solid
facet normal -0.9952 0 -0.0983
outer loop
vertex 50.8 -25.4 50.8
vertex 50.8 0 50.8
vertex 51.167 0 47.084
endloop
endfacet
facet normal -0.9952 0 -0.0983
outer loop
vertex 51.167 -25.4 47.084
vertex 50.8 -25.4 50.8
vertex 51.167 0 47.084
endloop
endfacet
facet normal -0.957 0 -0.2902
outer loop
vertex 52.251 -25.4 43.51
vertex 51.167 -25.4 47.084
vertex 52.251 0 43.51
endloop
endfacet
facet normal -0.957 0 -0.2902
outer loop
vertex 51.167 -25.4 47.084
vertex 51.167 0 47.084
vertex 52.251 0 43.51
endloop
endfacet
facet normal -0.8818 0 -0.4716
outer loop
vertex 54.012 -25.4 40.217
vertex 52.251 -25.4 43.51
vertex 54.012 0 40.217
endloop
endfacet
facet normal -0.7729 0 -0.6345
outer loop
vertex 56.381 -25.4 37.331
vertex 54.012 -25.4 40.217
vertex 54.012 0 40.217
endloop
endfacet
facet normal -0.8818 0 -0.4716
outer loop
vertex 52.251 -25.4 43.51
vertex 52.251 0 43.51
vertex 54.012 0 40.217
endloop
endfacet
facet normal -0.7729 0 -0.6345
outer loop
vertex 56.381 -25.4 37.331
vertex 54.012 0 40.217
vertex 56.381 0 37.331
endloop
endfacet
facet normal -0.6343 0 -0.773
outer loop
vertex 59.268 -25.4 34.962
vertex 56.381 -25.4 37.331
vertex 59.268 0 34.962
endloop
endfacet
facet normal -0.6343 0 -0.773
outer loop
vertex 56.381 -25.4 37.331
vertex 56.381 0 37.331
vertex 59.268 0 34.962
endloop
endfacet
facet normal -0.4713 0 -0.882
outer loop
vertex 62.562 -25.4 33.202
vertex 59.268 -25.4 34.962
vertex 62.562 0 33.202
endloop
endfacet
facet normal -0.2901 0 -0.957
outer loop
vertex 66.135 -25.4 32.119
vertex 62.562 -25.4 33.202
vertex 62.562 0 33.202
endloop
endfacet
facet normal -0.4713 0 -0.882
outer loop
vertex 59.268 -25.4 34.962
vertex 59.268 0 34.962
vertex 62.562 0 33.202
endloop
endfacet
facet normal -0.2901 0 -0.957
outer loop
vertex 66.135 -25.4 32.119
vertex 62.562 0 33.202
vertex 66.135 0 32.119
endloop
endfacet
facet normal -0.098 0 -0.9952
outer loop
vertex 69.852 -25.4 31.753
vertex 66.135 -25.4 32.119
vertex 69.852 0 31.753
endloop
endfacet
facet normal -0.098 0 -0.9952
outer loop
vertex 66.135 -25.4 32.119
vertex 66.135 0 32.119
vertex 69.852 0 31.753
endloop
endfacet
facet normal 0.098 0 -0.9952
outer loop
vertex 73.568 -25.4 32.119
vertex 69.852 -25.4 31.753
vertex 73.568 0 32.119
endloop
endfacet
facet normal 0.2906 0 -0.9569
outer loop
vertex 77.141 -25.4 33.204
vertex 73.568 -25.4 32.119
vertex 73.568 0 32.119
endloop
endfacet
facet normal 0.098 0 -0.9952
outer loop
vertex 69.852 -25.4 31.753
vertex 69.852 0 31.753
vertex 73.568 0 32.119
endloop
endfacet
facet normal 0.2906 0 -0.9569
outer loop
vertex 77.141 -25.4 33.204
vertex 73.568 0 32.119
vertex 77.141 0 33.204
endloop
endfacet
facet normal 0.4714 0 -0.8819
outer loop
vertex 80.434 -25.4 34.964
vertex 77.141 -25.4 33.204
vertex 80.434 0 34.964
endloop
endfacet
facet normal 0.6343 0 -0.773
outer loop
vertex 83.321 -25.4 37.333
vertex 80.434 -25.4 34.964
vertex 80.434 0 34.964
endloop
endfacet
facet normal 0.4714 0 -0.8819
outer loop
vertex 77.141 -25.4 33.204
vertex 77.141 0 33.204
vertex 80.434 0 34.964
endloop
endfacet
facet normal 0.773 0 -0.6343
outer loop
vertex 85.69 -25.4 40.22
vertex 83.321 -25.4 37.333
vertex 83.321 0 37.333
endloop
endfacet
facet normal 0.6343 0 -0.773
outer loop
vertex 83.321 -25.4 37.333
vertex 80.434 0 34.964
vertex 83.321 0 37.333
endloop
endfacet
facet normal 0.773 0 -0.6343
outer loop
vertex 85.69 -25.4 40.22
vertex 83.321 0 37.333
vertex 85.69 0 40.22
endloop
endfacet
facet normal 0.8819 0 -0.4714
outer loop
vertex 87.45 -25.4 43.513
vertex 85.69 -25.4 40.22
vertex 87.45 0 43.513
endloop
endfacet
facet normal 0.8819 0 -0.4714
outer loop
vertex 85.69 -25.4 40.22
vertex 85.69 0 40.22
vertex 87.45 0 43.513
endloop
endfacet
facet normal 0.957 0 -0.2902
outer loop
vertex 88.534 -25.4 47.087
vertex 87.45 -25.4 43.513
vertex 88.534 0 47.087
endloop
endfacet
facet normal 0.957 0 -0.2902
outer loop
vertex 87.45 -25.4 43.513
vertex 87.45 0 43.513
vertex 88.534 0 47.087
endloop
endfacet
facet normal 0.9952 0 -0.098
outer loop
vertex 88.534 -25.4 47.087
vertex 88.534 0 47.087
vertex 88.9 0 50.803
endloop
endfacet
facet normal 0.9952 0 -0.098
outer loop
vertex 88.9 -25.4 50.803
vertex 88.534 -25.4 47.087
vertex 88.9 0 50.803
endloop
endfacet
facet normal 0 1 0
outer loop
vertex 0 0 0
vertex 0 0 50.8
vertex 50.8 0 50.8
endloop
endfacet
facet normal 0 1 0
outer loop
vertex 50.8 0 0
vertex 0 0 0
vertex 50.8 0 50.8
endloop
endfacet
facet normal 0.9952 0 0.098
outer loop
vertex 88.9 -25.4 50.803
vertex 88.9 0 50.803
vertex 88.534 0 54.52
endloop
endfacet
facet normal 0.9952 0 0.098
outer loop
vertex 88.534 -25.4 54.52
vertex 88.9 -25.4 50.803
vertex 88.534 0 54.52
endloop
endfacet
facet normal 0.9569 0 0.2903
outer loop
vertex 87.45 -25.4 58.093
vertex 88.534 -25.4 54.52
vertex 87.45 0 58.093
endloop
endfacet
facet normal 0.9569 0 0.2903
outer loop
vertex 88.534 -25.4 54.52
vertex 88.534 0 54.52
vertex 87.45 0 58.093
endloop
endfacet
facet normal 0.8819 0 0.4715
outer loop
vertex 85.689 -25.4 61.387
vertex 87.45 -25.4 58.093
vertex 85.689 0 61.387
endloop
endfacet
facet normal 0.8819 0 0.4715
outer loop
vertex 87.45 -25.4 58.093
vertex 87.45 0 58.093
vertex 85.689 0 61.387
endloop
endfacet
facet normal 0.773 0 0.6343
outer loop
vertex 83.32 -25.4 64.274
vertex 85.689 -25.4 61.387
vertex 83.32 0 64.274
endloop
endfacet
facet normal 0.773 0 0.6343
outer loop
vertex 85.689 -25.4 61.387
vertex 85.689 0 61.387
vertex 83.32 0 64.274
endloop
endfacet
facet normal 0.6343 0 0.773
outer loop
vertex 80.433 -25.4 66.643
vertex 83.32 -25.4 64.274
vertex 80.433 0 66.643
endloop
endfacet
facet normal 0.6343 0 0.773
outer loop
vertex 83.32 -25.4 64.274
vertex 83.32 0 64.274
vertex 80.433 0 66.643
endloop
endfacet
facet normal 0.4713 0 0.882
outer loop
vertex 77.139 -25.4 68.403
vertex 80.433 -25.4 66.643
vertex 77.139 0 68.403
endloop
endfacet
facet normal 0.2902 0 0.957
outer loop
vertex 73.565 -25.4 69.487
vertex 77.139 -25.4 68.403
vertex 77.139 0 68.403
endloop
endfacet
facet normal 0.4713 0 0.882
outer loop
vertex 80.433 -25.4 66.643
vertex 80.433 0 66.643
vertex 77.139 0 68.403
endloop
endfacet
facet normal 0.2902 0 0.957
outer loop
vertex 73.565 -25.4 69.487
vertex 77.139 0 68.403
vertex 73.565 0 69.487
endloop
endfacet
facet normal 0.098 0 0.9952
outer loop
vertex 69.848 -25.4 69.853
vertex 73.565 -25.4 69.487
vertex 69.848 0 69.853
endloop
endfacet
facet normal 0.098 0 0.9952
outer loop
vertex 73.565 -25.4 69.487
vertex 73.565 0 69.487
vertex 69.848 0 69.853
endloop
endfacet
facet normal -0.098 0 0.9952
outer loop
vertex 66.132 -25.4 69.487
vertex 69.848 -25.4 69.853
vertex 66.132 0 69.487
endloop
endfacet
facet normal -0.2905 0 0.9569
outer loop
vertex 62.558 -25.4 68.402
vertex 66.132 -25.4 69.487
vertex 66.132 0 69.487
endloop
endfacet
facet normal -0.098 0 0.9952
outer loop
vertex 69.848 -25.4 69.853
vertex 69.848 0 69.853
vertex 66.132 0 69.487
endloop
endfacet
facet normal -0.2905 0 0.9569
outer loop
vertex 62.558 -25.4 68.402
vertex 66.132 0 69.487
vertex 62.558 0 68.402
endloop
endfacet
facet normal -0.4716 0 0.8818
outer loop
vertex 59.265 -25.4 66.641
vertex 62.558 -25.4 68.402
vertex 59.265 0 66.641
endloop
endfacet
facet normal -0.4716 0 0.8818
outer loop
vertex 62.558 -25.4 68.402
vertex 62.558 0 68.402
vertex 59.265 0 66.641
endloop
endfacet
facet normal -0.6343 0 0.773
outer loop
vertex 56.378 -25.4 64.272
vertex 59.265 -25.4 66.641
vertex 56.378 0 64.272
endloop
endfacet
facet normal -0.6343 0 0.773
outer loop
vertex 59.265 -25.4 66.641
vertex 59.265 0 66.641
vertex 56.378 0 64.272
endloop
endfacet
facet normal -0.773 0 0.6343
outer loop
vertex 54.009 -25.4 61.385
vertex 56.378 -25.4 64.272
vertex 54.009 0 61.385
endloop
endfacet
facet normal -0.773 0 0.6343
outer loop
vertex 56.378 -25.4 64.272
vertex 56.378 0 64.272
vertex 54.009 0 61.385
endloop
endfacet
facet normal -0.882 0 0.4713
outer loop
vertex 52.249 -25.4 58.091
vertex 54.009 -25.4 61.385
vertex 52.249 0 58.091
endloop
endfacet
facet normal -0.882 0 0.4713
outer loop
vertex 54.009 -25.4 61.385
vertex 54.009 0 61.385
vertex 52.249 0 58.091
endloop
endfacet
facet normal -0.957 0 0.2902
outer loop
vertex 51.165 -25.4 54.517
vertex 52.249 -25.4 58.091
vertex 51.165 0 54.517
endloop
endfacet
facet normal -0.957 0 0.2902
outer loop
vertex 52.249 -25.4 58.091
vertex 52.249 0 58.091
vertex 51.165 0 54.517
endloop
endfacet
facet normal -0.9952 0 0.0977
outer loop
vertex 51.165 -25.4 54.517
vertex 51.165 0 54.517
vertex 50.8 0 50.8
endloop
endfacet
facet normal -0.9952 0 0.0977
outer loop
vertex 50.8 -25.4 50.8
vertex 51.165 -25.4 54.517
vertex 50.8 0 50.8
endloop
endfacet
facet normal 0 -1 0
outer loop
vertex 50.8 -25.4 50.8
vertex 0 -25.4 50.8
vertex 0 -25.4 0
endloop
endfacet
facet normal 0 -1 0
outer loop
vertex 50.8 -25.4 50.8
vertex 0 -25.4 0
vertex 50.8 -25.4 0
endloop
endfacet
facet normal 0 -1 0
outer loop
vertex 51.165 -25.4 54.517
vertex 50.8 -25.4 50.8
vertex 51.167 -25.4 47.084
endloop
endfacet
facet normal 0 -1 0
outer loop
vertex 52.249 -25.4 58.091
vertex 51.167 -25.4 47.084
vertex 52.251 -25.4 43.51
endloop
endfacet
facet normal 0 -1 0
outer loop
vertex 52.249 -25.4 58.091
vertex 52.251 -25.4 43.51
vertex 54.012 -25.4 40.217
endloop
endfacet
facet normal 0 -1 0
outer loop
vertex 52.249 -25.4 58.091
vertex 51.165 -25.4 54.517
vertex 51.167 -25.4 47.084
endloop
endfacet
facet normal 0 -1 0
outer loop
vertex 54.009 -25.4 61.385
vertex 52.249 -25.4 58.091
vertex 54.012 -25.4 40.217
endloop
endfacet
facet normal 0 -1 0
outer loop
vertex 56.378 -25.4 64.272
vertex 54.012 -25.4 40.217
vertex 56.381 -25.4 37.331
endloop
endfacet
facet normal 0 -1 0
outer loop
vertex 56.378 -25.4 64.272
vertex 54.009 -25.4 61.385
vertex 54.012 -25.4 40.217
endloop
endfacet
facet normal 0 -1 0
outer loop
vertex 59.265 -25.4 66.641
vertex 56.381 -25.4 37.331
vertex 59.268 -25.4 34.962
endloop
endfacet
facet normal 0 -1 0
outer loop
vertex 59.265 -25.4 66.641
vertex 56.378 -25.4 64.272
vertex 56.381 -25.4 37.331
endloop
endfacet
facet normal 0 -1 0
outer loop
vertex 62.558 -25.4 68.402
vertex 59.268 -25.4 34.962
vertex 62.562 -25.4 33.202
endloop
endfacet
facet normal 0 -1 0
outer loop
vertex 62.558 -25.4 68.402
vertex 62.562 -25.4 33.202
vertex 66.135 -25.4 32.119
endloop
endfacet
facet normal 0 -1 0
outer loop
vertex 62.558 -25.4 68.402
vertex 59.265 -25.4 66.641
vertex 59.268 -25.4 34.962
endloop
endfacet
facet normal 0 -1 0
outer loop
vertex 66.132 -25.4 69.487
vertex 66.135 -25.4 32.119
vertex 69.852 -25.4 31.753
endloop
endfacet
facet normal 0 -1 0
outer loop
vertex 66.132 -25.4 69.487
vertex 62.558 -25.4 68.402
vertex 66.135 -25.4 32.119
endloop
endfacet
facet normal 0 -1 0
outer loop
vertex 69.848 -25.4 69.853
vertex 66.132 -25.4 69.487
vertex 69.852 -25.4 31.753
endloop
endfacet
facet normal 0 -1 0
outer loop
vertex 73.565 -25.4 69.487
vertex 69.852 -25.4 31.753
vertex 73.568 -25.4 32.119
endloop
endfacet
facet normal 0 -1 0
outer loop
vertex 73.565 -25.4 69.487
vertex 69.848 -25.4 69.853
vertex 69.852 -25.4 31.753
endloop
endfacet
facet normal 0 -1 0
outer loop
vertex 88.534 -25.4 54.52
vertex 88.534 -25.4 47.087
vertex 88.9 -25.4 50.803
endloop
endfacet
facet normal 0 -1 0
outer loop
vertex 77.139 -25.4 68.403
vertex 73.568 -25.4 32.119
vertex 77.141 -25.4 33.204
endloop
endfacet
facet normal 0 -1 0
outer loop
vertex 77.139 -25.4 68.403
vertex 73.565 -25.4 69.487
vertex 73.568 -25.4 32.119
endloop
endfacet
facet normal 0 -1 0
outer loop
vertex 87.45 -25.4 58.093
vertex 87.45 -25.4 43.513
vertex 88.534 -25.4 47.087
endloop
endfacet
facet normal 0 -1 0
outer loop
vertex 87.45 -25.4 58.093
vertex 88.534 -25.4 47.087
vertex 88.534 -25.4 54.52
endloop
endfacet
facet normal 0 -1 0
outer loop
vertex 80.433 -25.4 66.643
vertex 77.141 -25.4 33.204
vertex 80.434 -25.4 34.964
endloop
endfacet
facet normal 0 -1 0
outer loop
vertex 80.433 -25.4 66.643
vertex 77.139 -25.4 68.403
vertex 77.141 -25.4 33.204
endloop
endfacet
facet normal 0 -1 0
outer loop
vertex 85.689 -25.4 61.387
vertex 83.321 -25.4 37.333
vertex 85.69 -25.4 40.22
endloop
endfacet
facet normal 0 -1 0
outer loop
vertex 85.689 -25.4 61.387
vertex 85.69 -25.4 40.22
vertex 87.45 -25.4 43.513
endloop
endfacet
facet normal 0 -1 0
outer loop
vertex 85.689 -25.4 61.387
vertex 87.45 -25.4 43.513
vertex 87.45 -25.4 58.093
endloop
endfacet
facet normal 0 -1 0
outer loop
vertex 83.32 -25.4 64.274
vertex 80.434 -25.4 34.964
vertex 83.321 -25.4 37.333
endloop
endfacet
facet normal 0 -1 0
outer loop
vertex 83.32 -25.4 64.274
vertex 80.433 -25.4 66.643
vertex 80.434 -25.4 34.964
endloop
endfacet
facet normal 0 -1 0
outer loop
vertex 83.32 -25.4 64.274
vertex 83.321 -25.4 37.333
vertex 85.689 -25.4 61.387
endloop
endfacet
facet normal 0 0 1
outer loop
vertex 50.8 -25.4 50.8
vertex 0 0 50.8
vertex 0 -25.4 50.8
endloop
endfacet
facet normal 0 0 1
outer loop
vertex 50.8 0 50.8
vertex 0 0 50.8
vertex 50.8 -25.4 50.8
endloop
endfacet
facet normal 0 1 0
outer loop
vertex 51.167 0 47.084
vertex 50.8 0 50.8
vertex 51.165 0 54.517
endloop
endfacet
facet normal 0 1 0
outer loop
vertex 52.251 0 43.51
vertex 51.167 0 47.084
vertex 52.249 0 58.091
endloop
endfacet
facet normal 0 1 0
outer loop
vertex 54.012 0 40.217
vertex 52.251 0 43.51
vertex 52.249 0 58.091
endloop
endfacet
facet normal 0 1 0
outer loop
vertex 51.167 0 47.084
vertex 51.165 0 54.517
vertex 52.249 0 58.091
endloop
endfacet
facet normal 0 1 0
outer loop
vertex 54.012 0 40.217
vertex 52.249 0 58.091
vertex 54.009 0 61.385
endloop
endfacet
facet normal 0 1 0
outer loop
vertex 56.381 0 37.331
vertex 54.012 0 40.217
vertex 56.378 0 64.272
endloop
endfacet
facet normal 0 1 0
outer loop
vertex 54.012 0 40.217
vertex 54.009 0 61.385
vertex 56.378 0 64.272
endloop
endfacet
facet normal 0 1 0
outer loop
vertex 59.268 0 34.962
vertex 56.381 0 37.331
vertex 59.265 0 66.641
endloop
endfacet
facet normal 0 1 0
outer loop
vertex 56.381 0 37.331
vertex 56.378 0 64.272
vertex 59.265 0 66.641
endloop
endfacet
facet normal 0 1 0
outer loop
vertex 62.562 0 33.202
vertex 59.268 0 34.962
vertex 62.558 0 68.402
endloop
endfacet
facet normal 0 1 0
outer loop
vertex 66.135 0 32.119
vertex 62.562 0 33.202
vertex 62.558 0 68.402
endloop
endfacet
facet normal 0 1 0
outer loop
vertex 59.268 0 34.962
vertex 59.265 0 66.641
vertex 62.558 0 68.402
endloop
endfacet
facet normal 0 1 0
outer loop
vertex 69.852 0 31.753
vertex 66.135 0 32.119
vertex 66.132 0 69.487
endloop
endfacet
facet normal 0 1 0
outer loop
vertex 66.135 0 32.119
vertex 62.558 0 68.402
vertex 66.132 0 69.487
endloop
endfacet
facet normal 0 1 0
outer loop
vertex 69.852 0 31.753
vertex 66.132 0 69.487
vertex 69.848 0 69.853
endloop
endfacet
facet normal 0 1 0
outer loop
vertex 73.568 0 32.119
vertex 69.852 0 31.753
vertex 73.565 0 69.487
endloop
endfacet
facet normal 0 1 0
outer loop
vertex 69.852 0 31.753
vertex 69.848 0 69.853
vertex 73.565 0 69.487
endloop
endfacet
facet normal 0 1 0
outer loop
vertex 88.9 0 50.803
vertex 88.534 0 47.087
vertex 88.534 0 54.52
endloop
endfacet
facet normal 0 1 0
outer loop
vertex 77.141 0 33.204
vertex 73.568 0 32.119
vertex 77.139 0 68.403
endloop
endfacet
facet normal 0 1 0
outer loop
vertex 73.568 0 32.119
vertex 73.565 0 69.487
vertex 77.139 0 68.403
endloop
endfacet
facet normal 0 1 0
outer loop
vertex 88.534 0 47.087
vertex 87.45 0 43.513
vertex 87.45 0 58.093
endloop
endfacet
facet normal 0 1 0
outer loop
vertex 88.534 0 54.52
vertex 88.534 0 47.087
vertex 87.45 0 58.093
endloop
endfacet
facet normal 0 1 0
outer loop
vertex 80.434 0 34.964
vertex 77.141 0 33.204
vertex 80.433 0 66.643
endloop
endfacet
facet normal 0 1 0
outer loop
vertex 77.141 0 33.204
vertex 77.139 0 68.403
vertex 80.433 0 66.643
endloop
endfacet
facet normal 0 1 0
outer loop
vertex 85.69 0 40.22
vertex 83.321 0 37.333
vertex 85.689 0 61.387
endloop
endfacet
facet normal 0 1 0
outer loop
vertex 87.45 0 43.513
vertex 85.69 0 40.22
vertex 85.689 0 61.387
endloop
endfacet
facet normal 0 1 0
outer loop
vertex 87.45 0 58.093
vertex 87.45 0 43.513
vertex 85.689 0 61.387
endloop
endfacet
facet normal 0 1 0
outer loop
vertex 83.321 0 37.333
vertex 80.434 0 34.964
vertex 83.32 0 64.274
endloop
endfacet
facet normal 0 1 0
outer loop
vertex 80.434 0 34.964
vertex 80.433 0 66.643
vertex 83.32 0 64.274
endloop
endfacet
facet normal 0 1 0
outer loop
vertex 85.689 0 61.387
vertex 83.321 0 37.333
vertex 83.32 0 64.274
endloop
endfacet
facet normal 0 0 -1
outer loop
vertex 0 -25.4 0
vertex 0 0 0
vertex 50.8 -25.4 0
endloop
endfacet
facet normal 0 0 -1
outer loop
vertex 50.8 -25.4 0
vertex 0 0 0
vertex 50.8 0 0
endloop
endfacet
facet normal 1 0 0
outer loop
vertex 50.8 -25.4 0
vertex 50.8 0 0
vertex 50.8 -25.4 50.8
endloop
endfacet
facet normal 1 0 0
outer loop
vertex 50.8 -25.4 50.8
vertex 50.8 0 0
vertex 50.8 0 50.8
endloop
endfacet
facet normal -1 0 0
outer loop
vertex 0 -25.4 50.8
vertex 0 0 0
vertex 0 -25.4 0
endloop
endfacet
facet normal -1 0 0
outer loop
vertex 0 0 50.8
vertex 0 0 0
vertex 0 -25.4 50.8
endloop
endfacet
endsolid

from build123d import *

# Parameters (mm, degrees)
F0_W     = 50.8
F0_H     = 50.8
F1_DEPTH = 25.4


with BuildPart() as f1:
    # F0 (on Front) → F1 (new body)
    with BuildSketch(Plane.XZ):
        with Locations((25.4, 25.4)):
            Rectangle(F0_W, F0_H)
    extrude(amount=F1_DEPTH)


with BuildPart() as f1b:
    # F0 (on Front) → F1, piece 2 (new body)
    with BuildSketch(Plane.XZ):
        with BuildLine():
            ThreePointArc((88.9, 50.8030205965), (69.8484897018, 69.8530205366), (50.8000002395, 50.8))
            ThreePointArc((50.8000002395, 50.8), (69.8515102982, 31.7530206564), (88.9, 50.8030205965))
        make_face()
    extrude(amount=F1_DEPTH)


solid = Compound([f1.part, f1b.part])
